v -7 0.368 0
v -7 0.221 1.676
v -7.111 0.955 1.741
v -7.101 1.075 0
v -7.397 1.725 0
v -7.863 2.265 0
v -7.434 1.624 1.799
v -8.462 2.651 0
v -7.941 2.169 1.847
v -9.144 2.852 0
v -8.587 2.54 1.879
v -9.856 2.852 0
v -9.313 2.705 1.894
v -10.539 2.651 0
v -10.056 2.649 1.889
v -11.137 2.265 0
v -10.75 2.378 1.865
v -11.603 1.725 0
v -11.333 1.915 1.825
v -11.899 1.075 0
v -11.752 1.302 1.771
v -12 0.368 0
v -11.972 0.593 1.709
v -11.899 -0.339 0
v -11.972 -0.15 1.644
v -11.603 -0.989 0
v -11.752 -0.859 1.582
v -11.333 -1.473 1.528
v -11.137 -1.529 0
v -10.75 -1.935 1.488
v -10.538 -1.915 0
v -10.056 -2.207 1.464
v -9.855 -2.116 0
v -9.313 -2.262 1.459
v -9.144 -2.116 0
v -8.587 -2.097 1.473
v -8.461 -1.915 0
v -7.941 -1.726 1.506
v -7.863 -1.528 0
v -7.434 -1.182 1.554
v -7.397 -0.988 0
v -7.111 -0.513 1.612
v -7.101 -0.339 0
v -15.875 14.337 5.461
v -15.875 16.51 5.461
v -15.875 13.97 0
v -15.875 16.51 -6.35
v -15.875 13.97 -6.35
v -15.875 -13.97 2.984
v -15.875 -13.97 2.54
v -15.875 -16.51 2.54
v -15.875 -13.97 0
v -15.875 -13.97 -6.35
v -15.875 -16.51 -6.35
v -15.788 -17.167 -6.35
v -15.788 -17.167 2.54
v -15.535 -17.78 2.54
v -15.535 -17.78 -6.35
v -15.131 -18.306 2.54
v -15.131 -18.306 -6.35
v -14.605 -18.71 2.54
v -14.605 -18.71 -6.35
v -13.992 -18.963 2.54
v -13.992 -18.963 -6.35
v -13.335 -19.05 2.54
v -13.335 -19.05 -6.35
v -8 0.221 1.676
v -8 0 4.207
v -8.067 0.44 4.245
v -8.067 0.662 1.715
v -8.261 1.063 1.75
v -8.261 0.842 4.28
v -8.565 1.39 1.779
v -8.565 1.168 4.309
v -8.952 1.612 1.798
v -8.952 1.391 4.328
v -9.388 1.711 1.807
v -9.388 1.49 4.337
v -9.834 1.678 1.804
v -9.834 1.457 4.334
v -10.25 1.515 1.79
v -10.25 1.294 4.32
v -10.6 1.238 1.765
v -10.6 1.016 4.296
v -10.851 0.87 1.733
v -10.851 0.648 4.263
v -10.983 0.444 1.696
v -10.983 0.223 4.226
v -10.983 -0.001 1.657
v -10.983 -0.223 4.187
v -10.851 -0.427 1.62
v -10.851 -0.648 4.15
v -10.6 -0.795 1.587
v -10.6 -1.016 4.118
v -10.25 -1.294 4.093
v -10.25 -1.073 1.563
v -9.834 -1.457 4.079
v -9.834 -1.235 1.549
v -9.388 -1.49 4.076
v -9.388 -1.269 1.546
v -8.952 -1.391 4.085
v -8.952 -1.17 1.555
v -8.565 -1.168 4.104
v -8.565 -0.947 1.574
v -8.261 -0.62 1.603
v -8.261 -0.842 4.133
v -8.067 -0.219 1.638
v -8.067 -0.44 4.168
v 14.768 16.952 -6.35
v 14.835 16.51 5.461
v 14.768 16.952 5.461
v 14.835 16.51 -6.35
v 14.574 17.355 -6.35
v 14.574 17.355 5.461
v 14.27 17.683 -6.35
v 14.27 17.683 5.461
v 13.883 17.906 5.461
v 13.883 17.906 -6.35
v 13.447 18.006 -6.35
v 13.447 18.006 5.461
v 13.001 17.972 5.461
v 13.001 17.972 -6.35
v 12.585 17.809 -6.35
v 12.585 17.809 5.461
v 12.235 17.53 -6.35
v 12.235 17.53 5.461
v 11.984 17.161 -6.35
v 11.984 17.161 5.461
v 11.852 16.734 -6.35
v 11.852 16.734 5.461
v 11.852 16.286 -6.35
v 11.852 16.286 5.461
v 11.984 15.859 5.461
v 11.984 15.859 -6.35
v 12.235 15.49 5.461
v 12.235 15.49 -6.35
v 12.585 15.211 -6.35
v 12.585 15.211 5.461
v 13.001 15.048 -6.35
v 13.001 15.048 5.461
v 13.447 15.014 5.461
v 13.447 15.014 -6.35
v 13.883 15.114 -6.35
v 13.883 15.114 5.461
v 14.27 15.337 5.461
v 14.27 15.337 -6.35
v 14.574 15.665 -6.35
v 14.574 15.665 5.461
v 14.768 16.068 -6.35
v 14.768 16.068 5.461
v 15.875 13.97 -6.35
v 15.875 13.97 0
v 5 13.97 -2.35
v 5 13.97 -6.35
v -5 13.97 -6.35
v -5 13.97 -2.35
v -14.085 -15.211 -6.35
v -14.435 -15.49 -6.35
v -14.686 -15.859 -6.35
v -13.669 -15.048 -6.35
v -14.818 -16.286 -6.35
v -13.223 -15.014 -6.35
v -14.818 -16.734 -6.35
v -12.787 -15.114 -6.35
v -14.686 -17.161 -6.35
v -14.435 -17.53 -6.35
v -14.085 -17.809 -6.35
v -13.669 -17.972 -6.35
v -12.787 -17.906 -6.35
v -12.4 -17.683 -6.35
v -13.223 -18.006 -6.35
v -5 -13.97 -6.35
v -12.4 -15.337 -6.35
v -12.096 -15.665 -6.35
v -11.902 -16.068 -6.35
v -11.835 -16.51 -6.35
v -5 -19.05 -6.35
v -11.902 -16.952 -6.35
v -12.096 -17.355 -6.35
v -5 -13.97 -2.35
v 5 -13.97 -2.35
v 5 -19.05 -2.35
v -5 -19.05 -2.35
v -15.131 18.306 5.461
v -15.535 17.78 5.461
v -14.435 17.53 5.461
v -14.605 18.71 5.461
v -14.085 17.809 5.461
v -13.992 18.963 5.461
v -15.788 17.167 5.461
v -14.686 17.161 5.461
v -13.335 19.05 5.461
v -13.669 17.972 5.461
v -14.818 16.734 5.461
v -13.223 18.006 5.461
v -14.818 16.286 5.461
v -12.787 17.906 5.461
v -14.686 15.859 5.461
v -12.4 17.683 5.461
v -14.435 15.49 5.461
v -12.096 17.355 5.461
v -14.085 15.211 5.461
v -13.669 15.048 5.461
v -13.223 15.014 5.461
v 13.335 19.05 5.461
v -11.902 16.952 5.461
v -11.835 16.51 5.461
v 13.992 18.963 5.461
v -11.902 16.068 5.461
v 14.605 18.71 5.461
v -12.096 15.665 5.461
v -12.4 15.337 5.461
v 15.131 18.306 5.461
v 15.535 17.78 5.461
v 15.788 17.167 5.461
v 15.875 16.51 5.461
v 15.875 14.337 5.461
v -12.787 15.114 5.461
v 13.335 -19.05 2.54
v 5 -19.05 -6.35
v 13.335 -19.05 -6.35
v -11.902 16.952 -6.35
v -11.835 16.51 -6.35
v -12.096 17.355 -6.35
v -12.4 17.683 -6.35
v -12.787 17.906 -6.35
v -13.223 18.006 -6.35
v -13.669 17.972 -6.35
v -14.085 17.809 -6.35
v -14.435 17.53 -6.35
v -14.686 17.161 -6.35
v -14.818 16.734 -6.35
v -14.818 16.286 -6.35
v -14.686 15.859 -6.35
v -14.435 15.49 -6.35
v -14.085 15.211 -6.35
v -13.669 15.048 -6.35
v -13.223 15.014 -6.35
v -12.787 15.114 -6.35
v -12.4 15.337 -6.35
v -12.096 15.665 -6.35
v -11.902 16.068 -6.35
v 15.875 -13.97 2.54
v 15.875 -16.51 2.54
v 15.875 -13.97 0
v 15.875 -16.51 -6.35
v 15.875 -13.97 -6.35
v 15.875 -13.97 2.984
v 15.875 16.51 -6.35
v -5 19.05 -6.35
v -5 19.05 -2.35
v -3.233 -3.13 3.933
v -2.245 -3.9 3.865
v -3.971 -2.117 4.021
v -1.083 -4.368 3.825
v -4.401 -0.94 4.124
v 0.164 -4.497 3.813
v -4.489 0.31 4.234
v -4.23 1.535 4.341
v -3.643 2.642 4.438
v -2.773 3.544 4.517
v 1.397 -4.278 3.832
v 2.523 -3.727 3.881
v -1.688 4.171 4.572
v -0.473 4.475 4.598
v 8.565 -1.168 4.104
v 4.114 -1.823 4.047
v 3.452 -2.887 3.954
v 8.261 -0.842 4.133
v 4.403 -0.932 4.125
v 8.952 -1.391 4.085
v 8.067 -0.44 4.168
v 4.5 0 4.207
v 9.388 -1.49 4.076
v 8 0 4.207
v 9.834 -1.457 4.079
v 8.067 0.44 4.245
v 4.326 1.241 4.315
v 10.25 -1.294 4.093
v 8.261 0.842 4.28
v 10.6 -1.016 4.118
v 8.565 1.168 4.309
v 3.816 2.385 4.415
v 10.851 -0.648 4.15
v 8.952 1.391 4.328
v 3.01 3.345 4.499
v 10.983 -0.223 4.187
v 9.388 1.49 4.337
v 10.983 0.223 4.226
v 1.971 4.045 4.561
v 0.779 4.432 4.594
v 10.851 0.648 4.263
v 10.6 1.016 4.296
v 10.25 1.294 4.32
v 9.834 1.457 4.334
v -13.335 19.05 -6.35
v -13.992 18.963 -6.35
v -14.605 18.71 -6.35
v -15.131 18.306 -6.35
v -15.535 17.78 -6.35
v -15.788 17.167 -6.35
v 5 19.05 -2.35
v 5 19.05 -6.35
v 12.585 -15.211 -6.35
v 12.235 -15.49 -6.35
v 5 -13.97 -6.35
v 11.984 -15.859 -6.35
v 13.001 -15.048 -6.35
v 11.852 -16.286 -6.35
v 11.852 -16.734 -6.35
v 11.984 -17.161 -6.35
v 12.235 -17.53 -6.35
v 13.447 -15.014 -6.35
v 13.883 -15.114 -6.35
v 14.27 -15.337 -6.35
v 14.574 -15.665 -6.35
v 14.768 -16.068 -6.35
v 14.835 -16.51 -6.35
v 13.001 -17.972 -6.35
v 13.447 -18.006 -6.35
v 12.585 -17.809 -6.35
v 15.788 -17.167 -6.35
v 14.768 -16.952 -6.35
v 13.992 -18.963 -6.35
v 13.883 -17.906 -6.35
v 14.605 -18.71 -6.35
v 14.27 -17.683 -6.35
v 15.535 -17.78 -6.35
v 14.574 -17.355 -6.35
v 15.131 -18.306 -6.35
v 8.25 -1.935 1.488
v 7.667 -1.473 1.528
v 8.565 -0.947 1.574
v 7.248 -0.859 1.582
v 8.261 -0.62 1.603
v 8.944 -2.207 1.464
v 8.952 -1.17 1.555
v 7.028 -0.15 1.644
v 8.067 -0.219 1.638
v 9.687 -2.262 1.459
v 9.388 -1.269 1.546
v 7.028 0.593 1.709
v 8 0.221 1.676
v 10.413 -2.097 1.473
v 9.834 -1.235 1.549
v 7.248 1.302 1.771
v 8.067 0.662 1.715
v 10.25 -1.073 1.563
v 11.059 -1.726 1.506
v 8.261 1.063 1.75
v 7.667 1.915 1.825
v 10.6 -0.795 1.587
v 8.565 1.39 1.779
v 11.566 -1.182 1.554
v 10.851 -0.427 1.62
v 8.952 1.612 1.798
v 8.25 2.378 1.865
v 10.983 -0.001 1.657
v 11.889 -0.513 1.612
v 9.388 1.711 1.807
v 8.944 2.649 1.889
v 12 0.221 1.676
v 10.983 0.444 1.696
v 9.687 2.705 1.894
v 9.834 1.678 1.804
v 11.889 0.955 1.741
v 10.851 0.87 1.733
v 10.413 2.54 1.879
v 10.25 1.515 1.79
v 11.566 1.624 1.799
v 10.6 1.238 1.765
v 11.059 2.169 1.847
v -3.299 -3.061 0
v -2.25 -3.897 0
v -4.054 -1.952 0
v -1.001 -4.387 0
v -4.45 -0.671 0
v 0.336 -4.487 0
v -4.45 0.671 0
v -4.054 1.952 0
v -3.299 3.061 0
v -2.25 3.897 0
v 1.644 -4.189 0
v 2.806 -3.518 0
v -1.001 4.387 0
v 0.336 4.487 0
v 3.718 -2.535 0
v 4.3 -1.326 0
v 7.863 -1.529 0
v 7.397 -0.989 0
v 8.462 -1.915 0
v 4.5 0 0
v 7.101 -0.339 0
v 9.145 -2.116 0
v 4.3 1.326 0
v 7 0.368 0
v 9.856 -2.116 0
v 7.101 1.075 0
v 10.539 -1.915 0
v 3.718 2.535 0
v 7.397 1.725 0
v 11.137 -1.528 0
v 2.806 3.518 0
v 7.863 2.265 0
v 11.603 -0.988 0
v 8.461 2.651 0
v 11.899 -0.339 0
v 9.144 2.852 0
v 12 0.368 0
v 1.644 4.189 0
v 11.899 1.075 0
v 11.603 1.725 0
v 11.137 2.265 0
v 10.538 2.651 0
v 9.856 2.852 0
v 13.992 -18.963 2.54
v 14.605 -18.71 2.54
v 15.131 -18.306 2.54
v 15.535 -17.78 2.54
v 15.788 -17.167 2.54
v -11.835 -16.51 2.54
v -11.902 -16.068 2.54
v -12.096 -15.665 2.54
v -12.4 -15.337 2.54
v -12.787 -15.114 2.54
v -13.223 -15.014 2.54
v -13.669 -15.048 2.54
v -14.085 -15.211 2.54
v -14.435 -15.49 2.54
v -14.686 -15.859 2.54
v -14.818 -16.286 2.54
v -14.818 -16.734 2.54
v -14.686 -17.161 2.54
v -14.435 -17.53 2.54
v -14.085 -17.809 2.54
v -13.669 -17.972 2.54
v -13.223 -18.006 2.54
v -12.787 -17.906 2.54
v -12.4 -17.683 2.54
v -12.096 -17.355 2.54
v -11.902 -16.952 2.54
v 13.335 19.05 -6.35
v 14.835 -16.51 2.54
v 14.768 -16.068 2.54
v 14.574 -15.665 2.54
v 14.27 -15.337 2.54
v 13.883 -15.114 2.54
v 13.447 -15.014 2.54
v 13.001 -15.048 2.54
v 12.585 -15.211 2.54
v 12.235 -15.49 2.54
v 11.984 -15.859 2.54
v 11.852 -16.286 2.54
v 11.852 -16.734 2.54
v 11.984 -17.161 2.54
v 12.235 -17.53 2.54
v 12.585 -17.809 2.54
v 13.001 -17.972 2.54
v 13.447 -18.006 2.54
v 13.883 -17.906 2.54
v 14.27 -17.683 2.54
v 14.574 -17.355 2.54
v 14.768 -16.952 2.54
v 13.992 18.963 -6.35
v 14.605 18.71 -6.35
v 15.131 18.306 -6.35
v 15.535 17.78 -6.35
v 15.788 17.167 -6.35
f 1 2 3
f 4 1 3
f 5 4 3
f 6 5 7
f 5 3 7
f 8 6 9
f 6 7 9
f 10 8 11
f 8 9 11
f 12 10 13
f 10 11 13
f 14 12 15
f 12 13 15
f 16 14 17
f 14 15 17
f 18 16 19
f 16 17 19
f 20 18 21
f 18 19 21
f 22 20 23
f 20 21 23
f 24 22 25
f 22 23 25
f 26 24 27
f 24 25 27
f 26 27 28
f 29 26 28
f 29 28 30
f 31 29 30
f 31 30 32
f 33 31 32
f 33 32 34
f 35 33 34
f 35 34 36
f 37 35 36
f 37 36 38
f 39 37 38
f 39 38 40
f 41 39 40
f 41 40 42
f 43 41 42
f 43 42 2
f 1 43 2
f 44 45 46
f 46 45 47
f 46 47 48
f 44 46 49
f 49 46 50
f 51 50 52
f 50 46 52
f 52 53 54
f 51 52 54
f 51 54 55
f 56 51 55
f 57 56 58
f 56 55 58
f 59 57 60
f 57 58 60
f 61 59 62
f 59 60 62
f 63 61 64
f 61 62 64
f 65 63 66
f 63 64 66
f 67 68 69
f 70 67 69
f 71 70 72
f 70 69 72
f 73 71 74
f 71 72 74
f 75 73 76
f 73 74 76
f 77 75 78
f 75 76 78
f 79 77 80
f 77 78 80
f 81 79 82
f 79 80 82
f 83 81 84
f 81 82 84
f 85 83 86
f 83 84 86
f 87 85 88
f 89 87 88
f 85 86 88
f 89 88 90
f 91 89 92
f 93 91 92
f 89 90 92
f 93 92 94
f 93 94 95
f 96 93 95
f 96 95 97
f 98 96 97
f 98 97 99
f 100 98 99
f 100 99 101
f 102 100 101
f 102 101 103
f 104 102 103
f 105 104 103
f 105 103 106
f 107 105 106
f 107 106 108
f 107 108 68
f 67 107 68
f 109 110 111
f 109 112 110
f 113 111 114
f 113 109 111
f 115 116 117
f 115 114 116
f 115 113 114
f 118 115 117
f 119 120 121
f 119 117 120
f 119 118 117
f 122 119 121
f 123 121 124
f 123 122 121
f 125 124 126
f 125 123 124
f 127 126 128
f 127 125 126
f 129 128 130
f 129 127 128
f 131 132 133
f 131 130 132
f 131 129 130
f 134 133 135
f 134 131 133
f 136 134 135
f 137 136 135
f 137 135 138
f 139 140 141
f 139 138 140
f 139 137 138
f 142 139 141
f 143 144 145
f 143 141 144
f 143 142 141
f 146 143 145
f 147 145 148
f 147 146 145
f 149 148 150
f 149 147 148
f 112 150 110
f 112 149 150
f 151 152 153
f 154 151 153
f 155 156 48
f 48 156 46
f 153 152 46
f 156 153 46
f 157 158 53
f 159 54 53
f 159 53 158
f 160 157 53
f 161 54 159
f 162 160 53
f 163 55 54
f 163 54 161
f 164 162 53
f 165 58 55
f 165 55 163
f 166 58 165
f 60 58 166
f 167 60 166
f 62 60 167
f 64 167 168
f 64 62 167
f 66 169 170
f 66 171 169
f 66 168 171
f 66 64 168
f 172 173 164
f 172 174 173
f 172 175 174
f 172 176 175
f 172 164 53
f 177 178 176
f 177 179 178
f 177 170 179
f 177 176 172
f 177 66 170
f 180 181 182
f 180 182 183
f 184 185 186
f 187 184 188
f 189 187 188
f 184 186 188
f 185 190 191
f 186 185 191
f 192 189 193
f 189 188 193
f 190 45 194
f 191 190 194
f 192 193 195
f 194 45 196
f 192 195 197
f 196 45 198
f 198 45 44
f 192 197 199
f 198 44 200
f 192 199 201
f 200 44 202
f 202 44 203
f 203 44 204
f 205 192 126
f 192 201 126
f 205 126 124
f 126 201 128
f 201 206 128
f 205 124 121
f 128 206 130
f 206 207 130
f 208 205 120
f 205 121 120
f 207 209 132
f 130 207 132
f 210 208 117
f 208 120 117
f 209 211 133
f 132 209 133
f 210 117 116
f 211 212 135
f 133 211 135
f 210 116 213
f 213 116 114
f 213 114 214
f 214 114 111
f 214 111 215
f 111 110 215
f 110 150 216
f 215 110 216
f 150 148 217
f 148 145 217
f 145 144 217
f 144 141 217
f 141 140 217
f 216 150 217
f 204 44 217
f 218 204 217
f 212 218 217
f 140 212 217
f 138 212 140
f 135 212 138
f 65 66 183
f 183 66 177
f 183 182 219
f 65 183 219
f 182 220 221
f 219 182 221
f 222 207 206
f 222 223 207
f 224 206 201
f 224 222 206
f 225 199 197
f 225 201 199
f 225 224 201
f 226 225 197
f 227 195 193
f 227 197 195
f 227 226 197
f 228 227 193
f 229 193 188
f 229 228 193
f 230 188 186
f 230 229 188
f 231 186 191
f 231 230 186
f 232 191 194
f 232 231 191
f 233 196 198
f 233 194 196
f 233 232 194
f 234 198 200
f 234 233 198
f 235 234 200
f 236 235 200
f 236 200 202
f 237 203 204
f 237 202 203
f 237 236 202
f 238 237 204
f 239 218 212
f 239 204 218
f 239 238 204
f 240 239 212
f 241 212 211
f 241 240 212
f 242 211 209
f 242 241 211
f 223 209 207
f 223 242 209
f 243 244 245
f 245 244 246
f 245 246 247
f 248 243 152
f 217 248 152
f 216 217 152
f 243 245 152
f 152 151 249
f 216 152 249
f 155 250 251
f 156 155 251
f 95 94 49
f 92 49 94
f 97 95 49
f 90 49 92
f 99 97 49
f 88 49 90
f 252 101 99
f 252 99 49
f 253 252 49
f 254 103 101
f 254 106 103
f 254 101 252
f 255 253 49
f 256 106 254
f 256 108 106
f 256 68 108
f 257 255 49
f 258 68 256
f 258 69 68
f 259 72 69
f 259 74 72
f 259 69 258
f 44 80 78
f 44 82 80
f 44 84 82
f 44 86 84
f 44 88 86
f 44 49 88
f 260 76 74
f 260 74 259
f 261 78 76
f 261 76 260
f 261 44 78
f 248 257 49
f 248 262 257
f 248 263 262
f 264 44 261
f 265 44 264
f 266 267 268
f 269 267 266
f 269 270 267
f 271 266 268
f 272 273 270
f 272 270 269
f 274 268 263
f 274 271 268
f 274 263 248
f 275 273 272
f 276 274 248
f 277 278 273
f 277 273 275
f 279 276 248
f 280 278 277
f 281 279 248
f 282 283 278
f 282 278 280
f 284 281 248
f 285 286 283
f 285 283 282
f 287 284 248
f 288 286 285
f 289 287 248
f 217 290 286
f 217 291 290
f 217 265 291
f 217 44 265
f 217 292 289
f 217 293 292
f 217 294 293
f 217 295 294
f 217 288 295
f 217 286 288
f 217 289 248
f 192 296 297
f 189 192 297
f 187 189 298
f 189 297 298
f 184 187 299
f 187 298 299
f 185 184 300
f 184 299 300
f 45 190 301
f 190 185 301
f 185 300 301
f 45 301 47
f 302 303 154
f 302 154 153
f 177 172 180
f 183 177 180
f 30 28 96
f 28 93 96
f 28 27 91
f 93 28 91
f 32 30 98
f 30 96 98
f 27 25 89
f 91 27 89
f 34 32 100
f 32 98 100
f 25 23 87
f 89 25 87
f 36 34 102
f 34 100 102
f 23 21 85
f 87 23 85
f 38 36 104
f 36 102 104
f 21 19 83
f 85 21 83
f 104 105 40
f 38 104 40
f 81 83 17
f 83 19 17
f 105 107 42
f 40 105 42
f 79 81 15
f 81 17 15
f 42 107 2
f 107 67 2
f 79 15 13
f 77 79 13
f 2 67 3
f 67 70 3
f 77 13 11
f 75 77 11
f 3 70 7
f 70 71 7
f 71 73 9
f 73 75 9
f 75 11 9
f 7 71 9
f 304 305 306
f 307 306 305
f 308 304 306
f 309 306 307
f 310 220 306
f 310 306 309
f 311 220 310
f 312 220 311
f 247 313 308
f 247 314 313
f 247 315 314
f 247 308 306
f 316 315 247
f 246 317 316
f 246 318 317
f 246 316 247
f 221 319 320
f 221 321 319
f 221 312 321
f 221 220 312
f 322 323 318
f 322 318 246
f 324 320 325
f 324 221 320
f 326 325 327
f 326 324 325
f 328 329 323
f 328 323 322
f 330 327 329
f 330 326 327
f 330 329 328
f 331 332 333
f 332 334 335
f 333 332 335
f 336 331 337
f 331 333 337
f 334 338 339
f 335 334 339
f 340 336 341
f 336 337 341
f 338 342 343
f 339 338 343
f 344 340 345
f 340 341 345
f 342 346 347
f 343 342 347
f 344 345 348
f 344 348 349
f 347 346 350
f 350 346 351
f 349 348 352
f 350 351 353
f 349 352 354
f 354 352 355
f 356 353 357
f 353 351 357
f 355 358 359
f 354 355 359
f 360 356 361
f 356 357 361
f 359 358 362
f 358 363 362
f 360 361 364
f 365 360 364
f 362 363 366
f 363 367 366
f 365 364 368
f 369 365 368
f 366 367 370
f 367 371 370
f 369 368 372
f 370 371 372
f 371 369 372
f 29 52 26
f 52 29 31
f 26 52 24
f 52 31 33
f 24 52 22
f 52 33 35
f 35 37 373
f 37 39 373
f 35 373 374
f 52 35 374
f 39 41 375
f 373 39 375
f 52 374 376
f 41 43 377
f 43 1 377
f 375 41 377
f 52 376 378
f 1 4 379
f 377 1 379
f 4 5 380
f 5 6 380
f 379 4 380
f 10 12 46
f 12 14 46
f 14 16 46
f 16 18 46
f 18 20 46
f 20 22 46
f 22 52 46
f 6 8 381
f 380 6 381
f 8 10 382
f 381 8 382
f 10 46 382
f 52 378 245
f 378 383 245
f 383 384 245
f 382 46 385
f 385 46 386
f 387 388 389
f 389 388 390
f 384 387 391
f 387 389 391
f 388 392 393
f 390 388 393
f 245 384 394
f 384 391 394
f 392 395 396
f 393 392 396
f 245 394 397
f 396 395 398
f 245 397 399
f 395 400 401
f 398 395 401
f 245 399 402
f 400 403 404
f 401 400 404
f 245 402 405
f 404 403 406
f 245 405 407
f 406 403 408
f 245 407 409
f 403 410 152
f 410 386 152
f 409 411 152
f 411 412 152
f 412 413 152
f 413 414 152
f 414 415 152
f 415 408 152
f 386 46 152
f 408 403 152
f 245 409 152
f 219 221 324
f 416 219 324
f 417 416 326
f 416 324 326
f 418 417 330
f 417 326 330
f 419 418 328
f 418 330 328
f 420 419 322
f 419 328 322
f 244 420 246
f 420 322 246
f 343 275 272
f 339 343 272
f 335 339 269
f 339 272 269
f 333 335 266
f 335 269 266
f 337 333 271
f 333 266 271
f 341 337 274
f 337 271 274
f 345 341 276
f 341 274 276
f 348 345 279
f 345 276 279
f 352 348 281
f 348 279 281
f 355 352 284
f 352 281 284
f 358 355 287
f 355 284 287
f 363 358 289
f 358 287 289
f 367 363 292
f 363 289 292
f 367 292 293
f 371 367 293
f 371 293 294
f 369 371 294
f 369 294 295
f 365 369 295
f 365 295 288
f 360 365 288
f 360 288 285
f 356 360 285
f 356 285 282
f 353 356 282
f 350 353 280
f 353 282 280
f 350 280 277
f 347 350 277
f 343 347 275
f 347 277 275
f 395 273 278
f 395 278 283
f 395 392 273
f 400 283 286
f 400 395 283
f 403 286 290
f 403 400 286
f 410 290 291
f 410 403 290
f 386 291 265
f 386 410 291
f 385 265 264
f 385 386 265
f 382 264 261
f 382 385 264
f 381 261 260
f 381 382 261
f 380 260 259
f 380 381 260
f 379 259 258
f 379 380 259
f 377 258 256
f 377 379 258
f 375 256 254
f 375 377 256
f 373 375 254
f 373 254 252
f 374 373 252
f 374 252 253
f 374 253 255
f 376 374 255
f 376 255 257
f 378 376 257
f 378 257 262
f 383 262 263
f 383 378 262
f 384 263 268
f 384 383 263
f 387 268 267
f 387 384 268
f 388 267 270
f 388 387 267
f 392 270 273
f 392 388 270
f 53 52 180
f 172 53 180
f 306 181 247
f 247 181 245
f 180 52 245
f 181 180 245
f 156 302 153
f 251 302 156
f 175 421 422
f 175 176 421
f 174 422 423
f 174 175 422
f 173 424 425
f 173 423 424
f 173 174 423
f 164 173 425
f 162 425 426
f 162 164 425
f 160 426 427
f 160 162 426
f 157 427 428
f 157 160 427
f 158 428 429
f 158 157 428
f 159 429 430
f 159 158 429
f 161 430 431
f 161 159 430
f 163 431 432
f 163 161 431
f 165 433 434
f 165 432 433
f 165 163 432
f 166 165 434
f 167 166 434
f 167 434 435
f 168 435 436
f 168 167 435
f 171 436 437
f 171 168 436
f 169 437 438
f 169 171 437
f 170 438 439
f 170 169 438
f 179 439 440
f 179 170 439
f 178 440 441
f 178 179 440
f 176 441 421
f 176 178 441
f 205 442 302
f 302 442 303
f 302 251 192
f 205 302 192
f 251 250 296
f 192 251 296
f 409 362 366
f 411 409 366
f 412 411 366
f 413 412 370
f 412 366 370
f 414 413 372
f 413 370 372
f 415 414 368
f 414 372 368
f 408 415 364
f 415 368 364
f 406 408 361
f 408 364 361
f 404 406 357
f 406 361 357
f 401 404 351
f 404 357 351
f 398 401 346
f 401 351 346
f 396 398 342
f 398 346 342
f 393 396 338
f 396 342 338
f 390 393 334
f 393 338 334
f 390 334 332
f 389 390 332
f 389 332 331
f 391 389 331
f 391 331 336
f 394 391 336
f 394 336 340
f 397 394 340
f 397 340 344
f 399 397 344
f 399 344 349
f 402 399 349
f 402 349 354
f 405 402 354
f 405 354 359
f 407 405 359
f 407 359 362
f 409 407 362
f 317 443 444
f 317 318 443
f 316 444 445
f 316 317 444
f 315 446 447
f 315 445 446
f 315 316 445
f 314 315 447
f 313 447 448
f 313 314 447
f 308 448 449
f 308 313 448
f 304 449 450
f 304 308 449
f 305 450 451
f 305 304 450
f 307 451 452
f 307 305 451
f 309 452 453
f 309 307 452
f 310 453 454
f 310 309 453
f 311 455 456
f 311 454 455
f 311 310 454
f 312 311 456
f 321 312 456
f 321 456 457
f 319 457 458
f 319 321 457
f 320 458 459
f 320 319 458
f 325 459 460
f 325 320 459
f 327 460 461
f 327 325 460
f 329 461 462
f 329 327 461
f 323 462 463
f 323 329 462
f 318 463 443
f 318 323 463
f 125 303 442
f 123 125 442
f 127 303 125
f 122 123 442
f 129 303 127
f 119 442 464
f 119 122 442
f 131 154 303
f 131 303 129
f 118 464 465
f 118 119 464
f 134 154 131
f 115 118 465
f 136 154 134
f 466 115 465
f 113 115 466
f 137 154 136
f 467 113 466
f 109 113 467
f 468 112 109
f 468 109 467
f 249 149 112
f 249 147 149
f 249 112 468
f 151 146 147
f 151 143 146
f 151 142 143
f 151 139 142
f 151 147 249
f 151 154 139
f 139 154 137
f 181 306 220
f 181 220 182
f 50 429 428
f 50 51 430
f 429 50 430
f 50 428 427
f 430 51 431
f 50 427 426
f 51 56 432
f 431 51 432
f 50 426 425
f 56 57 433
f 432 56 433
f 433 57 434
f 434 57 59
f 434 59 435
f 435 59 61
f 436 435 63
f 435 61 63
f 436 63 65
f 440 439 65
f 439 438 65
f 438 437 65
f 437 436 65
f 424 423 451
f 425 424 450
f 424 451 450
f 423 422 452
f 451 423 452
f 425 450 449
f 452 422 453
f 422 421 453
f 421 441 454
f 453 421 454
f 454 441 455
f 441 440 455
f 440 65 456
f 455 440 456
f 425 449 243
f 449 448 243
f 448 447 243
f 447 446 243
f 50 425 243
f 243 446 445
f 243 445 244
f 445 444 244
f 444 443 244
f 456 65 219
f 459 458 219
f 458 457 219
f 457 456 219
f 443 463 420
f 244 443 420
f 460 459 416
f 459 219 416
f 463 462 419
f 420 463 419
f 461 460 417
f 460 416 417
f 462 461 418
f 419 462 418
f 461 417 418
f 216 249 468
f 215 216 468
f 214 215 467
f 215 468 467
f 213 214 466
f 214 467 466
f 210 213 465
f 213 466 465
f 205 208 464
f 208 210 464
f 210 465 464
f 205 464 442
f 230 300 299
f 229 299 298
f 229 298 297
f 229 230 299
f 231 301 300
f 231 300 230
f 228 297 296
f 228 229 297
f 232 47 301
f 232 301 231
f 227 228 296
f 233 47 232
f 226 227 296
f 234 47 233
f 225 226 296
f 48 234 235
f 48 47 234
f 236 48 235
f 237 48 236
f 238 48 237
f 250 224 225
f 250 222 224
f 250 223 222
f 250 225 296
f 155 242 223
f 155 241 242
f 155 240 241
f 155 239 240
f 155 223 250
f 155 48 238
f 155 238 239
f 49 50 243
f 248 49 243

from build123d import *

# Parameters (mm, degrees)
F0_R      = 1.5
F0_R_2    = 4.5
F1_DEPTH  = 2.54
F2_R      = 1.5
F3_DEPTH  = 6.35
F4_W      = 10
F4_H      = 4
F5_DEPTH  = 38.101
F7_DEPTH  = 25.4
F8_W      = 55.4393846542
F8_H      = 54.9912601709
F9_DEPTH  = 25.4
F10_R     = 1.5
F11_DEPTH = 25.4
F13_R     = 2.5
F13_R_2   = 1.5
F14_DEPTH = 25.4
F16_W     = 46.2689362466
F16_H     = 11.2376865
F17_DEPTH = 25.4
F19_W     = 33.8024366647
F19_H     = 5.08
F20_DEPTH = 25.4


with BuildPart() as f1:
    # F0 (on Top) → F1 (new body)
    with BuildSketch(Plane.XY):
        with BuildLine():
            ThreePointArc((15.875, 16.51), (15.1310512242, 18.3060512242), (13.335, 19.05))
            Line((13.335, 19.05), (-13.335, 19.05))
            ThreePointArc((-13.335, 19.05), (-15.1310512242, 18.3060512242), (-15.875, 16.51))
            Line((-15.875, 16.51), (-15.875, -16.51))
            ThreePointArc((-15.875, -16.51), (-15.1310512242, -18.3060512242), (-13.335, -19.05))
            Line((-13.335, -19.05), (13.335, -19.05))
            ThreePointArc((13.335, -19.05), (15.1310512242, -18.3060512242), (15.875, -16.51))
            Line((15.875, -16.51), (15.875, 16.51))
        make_face()
        with Locations((-13.335, -16.51)):
            Circle(F0_R, mode=Mode.SUBTRACT)
        with Locations((13.335, -16.51)):
            Circle(F0_R, mode=Mode.SUBTRACT)
        with Locations((-13.335, 16.51)):
            Circle(F0_R, mode=Mode.SUBTRACT)
        Circle(F0_R_2, mode=Mode.SUBTRACT)
        with Locations((13.335, 16.51)):
            Circle(F0_R, mode=Mode.SUBTRACT)
    extrude(amount=F1_DEPTH)

    # F2 (on face) → F3 (join)
    with BuildSketch(Plane(origin=(0, 0, 0), x_dir=(1, 0, 0), z_dir=(0, 0, -1))):
        with BuildLine():
            Line((-15.875, 16.51), (-15.875, 13.97))
            Line((-15.875, 13.97), (15.875, 13.97))
            Line((15.875, 13.97), (15.875, 16.51))
            ThreePointArc((15.875, 16.51), (15.1310512242, 18.3060512242), (13.335, 19.05))
            Line((13.335, 19.05), (-13.335, 19.05))
            ThreePointArc((-13.335, 19.05), (-15.1310512242, 18.3060512242), (-15.875, 16.51))
        make_face()
        with Locations((-13.335, 16.51)):
            Circle(F2_R, mode=Mode.SUBTRACT)
        with Locations((13.335, 16.51)):
            Circle(F2_R, mode=Mode.SUBTRACT)
        with BuildLine():
            Line((15.875, -13.97), (-15.875, -13.97))
            Line((-15.875, -13.97), (-15.875, -16.51))
            ThreePointArc((-15.875, -16.51), (-15.1310512242, -18.3060512242), (-13.335, -19.05))
            Line((-13.335, -19.05), (13.335, -19.05))
            ThreePointArc((13.335, -19.05), (15.1310512242, -18.3060512242), (15.875, -16.51))
            Line((15.875, -16.51), (15.875, -13.97))
        make_face()
        with Locations((-13.335, -16.51)):
            Circle(F2_R, mode=Mode.SUBTRACT)
        with Locations((13.335, -16.51)):
            Circle(F2_R, mode=Mode.SUBTRACT)
    extrude(amount=F3_DEPTH)

    # F4 (on face) → F5 (cut, through all)
    with BuildSketch(Plane(origin=(0, 19.05, 0), x_dir=(-1, 0, 0), z_dir=(0, 1, 0))):
        with Locations((0, -4.35)):
            Rectangle(F4_W, F4_H)
    extrude(amount=-F5_DEPTH, mode=Mode.SUBTRACT)

    # F7 (add): a face of the model
    f7_faces = [f1.faces().sort_by_distance(p)[0] for p in [
        (14.7803610119, 17.9553610119, 2.54),
    ]]
    extrude(f7_faces, amount=F7_DEPTH)

    # F8 (on face) → F9 (cut)
    with BuildSketch(Plane(origin=(0, -0.3652393382, 4.1747047386), x_dir=(1, 0, 0), z_dir=(0, -0.0871557427, 0.9961946981))):
        with Locations((6.7749572918, -4.9830414355)):
            Rectangle(F8_W, F8_H)
    extrude(amount=F9_DEPTH, mode=Mode.SUBTRACT)

    # F10 (on face) → F11 (cut)
    with BuildSketch(Plane(origin=(0, -0.3652393382, 4.1747047386), x_dir=(1, 0, 0), z_dir=(0, -0.0871557427, 0.9961946981))):
        with Locations((-9.5, 0.3666344931)):
            Circle(F10_R)
        with BuildLine():
            ThreePointArc((11, 0.3666344931), (9.5, 1.8666344931), (8, 0.3666344931))
            ThreePointArc((8, 0.3666344931), (9.5, -1.1333655069), (11, 0.3666344931))
        make_face()
    extrude(amount=-F11_DEPTH, mode=Mode.SUBTRACT)

    # F13 (on offset) → F14 (cut)
    with BuildSketch(Plane(origin=(0, -0.1438637516, 1.6443702054), x_dir=(1, 0, 0), z_dir=(0, -0.0871557427, 0.9961946981))):
        with Locations((-9.5, 0.3666344931)):
            Circle(F13_R)
        with Locations((-9.5, 0.3666344931)):
            Circle(F13_R_2, mode=Mode.SUBTRACT)
        with Locations((9.5, 0.3666344931)):
            Circle(F13_R)
        with Locations((9.5, 0.3666344931)):
            Circle(F13_R_2, mode=Mode.SUBTRACT)
    extrude(amount=-F14_DEPTH, mode=Mode.SUBTRACT)

    # F16 (on offset) → F17 (cut)
    with BuildSketch(Plane(origin=(0, 0, 5.461), x_dir=(1, 0, 0), z_dir=(0, 0, -1))):
        with Locations((-5.8952979743, -18.3988427743)):
            Rectangle(F16_W, F16_H)
    extrude(amount=-F17_DEPTH, mode=Mode.SUBTRACT)

    # F19 (on offset) → F20 (cut)
    with BuildSketch(Plane(origin=(0, 0, 2.54), x_dir=(1, 0, 0), z_dir=(0, 0, -1))):
        with Locations((1.0262183324, 16.51)):
            Rectangle(F19_W, F19_H)
    extrude(amount=-F20_DEPTH, mode=Mode.SUBTRACT)


solid = f1.part
